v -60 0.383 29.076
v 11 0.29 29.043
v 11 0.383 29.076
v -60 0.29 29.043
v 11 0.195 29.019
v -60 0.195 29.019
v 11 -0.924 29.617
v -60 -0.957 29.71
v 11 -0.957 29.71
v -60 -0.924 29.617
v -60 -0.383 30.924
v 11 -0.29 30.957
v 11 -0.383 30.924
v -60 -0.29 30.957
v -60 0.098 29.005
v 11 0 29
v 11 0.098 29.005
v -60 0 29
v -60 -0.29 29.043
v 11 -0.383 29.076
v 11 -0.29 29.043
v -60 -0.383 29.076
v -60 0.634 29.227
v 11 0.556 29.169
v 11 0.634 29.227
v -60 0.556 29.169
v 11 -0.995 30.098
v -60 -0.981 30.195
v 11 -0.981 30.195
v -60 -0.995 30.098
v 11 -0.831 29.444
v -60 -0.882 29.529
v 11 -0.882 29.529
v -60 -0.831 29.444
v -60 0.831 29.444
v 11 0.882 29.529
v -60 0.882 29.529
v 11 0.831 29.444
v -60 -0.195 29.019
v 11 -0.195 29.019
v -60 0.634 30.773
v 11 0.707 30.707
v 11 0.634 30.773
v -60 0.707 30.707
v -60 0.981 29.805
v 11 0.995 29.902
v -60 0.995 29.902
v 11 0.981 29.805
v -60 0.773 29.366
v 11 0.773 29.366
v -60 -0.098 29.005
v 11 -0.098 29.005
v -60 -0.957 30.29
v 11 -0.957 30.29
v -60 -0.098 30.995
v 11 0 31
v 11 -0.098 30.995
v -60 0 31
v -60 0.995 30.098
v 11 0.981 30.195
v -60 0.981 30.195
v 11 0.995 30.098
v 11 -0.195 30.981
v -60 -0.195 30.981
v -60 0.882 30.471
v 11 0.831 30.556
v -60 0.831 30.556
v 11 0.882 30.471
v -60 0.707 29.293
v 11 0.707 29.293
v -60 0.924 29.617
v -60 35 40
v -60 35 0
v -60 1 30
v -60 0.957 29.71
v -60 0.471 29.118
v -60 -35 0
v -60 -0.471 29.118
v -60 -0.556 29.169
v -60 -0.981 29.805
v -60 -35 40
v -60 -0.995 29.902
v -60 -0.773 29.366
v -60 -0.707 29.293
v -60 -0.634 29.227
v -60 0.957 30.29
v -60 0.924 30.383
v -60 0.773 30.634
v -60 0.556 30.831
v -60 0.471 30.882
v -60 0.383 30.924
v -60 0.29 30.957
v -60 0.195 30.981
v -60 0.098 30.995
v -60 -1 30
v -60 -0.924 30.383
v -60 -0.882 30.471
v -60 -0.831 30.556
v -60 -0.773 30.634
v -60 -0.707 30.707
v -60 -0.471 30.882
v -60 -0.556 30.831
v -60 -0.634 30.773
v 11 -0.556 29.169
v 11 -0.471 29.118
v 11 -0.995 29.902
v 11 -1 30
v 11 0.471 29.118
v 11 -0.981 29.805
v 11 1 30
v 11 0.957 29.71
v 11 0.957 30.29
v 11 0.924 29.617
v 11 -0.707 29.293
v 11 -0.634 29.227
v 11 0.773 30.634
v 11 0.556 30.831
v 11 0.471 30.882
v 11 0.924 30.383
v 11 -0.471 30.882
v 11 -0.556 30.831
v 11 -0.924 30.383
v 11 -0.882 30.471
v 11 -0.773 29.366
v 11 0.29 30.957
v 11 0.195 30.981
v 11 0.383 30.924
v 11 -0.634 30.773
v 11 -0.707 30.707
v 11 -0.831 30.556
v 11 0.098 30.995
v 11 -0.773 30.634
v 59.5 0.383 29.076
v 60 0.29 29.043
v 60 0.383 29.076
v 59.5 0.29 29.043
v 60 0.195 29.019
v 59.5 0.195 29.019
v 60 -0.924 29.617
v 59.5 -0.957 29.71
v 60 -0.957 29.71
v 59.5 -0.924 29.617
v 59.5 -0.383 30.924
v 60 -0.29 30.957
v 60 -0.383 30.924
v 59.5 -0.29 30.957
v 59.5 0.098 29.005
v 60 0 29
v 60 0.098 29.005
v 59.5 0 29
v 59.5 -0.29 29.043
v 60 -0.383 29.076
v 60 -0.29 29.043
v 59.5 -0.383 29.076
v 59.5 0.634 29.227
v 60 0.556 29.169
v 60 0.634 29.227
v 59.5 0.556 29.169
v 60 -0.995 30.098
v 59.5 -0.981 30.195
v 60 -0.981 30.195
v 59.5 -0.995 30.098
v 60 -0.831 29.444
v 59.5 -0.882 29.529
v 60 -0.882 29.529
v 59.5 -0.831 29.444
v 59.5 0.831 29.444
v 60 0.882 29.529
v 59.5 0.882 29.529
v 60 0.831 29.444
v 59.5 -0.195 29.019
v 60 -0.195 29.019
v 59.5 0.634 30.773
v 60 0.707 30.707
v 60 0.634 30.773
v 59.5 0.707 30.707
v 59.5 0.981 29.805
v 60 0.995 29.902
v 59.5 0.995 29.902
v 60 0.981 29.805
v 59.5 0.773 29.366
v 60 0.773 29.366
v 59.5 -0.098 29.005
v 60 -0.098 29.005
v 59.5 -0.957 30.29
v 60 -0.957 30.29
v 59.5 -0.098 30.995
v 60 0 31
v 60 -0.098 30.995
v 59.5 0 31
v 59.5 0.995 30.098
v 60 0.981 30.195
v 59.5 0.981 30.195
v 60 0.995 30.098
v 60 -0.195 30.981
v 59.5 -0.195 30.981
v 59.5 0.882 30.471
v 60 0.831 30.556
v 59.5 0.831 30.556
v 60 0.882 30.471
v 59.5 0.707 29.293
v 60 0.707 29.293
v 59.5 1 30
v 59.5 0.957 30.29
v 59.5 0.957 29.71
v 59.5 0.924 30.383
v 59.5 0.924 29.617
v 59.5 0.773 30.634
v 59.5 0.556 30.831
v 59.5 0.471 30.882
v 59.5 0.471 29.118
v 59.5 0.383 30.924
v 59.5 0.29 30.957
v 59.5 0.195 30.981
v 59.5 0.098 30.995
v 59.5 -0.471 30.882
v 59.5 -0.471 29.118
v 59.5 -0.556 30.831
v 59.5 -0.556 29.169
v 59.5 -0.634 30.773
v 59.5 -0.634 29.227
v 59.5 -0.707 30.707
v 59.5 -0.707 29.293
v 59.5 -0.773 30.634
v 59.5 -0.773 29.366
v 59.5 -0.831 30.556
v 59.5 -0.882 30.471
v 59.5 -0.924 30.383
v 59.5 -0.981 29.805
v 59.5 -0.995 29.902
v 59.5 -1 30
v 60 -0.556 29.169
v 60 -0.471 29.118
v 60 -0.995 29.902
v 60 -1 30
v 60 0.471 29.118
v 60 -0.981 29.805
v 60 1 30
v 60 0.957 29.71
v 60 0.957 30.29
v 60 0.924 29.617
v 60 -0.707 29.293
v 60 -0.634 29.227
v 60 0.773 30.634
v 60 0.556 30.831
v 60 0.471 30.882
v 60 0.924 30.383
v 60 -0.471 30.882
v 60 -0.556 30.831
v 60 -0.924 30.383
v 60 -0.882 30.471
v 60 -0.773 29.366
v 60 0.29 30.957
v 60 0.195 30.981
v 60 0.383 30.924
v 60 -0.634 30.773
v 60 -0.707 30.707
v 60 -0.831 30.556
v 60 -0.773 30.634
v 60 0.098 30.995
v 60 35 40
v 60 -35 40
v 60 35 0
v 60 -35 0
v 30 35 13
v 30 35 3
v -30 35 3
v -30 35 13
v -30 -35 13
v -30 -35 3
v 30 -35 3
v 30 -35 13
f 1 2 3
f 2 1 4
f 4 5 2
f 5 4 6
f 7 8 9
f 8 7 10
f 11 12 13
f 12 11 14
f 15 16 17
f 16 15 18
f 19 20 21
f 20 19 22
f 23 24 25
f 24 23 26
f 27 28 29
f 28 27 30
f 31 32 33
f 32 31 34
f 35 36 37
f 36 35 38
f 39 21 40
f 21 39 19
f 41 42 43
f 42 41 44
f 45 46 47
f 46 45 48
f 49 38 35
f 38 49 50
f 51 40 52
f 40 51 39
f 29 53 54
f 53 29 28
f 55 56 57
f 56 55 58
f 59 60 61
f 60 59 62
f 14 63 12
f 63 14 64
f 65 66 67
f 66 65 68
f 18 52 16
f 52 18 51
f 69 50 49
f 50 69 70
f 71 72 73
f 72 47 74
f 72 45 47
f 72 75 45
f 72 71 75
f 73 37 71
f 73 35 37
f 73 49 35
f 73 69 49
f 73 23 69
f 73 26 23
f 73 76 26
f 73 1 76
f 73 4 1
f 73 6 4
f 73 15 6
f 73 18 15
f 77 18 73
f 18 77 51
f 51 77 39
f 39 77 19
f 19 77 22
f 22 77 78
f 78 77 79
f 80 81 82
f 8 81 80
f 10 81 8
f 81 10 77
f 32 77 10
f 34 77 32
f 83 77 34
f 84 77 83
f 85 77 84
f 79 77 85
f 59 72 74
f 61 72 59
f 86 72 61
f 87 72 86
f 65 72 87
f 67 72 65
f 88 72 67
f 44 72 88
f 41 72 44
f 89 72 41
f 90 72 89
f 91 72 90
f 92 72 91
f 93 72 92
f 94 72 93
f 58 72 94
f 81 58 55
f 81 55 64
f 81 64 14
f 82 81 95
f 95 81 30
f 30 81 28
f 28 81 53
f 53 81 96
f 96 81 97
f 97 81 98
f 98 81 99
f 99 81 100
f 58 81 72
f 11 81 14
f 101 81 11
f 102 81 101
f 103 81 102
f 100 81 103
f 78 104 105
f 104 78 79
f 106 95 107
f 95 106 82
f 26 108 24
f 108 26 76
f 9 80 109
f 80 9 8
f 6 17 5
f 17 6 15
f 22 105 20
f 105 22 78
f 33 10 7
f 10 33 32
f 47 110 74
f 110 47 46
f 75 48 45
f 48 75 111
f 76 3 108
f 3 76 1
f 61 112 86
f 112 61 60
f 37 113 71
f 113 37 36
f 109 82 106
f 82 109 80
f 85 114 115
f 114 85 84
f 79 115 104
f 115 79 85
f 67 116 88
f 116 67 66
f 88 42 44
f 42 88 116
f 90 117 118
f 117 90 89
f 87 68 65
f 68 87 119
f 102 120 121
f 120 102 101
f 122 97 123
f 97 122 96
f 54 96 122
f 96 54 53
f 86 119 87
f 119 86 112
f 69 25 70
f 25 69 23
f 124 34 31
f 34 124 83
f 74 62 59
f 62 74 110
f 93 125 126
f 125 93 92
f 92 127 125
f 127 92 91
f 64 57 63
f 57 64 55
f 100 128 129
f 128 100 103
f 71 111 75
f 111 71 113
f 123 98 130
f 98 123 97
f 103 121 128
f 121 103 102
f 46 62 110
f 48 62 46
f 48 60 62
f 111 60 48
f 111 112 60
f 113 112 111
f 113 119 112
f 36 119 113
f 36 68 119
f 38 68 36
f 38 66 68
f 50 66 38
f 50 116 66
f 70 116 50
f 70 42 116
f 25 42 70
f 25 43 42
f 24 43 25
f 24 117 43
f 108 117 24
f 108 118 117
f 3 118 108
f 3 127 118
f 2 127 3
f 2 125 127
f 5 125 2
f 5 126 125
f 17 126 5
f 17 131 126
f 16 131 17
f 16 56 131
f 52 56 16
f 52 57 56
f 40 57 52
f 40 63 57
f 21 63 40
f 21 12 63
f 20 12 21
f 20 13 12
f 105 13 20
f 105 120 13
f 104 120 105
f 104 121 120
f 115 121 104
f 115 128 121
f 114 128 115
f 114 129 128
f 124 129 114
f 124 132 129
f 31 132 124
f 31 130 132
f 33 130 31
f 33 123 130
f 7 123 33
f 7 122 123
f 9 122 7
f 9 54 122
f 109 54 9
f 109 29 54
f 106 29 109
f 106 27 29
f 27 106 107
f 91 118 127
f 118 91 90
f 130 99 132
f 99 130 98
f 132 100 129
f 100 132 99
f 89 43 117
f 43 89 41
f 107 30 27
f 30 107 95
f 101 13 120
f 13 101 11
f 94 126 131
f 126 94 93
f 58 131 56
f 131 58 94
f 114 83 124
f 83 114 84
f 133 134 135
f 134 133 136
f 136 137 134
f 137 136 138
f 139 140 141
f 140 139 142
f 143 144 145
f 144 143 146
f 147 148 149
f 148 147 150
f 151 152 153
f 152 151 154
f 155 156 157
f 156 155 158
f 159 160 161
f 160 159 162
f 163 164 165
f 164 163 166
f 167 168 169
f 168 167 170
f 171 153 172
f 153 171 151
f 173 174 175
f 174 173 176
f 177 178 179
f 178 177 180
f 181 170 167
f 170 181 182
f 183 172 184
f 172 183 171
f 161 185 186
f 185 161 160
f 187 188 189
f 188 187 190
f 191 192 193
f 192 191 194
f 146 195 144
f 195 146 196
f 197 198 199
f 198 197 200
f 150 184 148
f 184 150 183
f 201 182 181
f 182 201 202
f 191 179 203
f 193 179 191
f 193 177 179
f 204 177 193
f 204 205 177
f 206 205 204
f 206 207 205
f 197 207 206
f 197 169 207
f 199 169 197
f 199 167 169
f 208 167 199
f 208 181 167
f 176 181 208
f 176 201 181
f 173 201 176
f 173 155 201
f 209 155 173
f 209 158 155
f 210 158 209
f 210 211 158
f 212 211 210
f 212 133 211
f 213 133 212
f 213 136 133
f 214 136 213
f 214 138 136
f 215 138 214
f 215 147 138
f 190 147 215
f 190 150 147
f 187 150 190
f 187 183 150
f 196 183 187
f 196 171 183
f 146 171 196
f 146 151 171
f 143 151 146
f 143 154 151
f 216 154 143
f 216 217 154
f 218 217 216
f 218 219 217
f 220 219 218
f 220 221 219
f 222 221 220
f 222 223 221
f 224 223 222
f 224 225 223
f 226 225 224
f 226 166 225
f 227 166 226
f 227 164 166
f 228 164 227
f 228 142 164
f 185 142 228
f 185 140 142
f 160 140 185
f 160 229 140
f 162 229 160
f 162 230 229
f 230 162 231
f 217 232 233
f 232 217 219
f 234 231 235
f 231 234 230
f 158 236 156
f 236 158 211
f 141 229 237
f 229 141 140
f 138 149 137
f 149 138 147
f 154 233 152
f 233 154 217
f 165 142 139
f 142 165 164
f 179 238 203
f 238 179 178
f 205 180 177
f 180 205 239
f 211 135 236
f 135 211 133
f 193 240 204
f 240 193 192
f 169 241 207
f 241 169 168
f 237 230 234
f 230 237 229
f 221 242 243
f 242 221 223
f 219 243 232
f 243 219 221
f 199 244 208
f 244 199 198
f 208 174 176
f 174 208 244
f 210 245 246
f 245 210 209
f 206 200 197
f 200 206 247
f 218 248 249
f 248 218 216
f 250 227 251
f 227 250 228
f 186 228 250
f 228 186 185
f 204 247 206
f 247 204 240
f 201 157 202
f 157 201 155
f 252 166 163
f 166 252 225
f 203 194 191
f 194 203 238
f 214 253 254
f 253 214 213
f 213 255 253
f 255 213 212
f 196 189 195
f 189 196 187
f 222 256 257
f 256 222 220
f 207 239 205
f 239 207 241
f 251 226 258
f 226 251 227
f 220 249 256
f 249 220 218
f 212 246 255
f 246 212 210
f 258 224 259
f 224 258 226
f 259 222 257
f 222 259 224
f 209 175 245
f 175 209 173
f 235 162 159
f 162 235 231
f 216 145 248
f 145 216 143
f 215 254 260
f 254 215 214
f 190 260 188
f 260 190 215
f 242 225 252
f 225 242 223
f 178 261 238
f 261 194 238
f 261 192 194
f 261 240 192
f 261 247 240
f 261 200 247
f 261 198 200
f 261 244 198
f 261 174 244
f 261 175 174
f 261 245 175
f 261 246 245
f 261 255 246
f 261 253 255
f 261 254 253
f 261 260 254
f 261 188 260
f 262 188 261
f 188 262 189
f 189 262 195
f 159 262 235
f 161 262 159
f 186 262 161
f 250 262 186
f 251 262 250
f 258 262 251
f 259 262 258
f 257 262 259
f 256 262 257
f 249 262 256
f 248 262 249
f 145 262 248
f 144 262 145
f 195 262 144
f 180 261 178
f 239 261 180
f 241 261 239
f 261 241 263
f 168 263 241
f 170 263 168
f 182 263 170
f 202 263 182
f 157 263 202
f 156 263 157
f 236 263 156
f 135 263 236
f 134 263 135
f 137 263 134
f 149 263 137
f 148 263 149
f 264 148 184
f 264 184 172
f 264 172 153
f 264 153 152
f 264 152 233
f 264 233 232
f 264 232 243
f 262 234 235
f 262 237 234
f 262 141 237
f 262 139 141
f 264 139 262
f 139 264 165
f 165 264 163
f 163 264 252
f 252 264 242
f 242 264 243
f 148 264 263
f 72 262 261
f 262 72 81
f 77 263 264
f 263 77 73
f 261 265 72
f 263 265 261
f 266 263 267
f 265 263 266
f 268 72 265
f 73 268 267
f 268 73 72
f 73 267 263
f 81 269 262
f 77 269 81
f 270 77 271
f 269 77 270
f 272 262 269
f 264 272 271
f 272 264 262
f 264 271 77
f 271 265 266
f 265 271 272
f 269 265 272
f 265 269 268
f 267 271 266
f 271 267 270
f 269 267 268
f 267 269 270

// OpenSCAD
// Mini horizontal gel-electrophoresis buffer tank
// Print orientation: base on XY plane, open top facing +Z

$fn = 64;

// ---- Tank dimensions ----
outer_x = 120;   // outer length in X
outer_y = 70;    // outer width in Y
height  = 40;    // overall height in Z
wall    = 3;     // wall thickness
floor   = 3;     // floor thickness

// ---- Platform dimensions ----
plat_len   = 60;  // platform length in X
plat_top_z = 13;  // top of platform (10 mm above inner floor)

// ---- Hole dimensions ----
hole_d = 2;       // electrode wire hole diameter
hole_y = 0;       // hole Y position
hole_z = 30;      // hole Z position

// ---- Derived ----
inner_h = height - floor;  // inner floor to open top
eps     = 0.5;            // cutter overshoot

difference() {
    // Tank body
    translate([-outer_x/2, -outer_y/2, 0])
        cube([outer_x, outer_y, height]);

    // Raised platform (full inner width, centred in X)
    translate([-plat_len/2, -outer_y/2, floor])
        cube([plat_len, outer_y, plat_top_z - floor]);

    // Horizontal electrode holes through end walls
    for (sx = [-1, 1])
        translate([sx > 0 ? outer_x/2 - eps : -outer_x/2, hole_y, hole_z])
            rotate([0, 90, 0])
                cylinder(d = hole_d, h = outer_y + 2*eps);
}
